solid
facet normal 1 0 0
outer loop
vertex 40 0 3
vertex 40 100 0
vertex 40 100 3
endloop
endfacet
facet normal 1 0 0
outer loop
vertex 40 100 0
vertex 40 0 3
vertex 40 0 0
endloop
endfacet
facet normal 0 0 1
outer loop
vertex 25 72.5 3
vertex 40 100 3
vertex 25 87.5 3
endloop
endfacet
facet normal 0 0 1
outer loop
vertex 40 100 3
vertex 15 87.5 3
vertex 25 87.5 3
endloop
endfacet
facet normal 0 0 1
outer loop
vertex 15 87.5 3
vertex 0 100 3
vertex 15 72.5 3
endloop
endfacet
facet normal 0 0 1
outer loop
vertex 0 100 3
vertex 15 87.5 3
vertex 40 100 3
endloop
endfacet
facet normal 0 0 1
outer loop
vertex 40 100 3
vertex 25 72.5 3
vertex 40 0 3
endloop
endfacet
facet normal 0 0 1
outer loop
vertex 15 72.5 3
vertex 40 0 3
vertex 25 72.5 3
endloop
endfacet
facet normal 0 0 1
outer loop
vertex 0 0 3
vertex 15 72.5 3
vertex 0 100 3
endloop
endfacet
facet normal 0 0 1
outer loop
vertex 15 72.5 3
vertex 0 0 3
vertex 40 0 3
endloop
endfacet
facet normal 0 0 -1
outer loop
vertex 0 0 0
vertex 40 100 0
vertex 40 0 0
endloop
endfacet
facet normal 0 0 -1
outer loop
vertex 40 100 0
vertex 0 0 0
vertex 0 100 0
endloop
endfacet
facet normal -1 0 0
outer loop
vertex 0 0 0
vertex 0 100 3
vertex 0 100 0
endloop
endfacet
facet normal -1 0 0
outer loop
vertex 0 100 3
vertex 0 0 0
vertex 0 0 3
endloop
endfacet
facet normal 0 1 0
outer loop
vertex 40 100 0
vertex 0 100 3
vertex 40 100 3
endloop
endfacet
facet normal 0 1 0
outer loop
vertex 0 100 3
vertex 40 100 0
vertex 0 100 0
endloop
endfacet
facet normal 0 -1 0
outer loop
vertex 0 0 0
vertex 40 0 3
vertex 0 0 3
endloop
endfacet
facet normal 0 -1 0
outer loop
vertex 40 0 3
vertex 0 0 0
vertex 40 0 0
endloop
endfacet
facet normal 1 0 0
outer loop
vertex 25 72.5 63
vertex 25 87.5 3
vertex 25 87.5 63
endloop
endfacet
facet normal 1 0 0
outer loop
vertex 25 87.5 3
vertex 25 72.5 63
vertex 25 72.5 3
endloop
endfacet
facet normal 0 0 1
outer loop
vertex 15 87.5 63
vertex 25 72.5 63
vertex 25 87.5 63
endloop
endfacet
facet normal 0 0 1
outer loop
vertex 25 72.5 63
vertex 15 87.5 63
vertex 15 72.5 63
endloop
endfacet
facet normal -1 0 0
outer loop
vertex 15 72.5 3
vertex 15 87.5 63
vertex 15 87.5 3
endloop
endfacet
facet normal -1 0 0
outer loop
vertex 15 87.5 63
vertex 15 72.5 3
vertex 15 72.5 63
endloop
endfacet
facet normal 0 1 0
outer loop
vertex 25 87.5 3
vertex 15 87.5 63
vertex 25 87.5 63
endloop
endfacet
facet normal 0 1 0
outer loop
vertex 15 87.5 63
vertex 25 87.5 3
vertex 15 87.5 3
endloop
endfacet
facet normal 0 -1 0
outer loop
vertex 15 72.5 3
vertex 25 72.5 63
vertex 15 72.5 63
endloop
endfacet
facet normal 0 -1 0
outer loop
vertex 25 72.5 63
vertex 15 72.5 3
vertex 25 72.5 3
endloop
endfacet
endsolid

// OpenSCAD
$fn = 100 * 1;

//  Length of the base plate
length = 100;

//  Width of the base plate
width = 40;

//  Thickness of the base plate
thickness = 3;

//  Displacement of the CENTER of the beam in x direction
dx = 20;

//  Displacement of the CENTER of the beam in y direction
dy = 80;

//  Thickness of the beam in x direction
beamWidth = 10;

//  Thickness of the beam in y direction
beamLength = 15;

//  Height of the beam
beamHeight = 60;

mount();

module mount()
{
    union()
    {
        cube([width, length, thickness]);
        translate([dx - beamWidth / 2, dy - beamLength / 2, thickness])
        {
            cube([beamWidth, beamLength, beamHeight]);
        }
    }
}
